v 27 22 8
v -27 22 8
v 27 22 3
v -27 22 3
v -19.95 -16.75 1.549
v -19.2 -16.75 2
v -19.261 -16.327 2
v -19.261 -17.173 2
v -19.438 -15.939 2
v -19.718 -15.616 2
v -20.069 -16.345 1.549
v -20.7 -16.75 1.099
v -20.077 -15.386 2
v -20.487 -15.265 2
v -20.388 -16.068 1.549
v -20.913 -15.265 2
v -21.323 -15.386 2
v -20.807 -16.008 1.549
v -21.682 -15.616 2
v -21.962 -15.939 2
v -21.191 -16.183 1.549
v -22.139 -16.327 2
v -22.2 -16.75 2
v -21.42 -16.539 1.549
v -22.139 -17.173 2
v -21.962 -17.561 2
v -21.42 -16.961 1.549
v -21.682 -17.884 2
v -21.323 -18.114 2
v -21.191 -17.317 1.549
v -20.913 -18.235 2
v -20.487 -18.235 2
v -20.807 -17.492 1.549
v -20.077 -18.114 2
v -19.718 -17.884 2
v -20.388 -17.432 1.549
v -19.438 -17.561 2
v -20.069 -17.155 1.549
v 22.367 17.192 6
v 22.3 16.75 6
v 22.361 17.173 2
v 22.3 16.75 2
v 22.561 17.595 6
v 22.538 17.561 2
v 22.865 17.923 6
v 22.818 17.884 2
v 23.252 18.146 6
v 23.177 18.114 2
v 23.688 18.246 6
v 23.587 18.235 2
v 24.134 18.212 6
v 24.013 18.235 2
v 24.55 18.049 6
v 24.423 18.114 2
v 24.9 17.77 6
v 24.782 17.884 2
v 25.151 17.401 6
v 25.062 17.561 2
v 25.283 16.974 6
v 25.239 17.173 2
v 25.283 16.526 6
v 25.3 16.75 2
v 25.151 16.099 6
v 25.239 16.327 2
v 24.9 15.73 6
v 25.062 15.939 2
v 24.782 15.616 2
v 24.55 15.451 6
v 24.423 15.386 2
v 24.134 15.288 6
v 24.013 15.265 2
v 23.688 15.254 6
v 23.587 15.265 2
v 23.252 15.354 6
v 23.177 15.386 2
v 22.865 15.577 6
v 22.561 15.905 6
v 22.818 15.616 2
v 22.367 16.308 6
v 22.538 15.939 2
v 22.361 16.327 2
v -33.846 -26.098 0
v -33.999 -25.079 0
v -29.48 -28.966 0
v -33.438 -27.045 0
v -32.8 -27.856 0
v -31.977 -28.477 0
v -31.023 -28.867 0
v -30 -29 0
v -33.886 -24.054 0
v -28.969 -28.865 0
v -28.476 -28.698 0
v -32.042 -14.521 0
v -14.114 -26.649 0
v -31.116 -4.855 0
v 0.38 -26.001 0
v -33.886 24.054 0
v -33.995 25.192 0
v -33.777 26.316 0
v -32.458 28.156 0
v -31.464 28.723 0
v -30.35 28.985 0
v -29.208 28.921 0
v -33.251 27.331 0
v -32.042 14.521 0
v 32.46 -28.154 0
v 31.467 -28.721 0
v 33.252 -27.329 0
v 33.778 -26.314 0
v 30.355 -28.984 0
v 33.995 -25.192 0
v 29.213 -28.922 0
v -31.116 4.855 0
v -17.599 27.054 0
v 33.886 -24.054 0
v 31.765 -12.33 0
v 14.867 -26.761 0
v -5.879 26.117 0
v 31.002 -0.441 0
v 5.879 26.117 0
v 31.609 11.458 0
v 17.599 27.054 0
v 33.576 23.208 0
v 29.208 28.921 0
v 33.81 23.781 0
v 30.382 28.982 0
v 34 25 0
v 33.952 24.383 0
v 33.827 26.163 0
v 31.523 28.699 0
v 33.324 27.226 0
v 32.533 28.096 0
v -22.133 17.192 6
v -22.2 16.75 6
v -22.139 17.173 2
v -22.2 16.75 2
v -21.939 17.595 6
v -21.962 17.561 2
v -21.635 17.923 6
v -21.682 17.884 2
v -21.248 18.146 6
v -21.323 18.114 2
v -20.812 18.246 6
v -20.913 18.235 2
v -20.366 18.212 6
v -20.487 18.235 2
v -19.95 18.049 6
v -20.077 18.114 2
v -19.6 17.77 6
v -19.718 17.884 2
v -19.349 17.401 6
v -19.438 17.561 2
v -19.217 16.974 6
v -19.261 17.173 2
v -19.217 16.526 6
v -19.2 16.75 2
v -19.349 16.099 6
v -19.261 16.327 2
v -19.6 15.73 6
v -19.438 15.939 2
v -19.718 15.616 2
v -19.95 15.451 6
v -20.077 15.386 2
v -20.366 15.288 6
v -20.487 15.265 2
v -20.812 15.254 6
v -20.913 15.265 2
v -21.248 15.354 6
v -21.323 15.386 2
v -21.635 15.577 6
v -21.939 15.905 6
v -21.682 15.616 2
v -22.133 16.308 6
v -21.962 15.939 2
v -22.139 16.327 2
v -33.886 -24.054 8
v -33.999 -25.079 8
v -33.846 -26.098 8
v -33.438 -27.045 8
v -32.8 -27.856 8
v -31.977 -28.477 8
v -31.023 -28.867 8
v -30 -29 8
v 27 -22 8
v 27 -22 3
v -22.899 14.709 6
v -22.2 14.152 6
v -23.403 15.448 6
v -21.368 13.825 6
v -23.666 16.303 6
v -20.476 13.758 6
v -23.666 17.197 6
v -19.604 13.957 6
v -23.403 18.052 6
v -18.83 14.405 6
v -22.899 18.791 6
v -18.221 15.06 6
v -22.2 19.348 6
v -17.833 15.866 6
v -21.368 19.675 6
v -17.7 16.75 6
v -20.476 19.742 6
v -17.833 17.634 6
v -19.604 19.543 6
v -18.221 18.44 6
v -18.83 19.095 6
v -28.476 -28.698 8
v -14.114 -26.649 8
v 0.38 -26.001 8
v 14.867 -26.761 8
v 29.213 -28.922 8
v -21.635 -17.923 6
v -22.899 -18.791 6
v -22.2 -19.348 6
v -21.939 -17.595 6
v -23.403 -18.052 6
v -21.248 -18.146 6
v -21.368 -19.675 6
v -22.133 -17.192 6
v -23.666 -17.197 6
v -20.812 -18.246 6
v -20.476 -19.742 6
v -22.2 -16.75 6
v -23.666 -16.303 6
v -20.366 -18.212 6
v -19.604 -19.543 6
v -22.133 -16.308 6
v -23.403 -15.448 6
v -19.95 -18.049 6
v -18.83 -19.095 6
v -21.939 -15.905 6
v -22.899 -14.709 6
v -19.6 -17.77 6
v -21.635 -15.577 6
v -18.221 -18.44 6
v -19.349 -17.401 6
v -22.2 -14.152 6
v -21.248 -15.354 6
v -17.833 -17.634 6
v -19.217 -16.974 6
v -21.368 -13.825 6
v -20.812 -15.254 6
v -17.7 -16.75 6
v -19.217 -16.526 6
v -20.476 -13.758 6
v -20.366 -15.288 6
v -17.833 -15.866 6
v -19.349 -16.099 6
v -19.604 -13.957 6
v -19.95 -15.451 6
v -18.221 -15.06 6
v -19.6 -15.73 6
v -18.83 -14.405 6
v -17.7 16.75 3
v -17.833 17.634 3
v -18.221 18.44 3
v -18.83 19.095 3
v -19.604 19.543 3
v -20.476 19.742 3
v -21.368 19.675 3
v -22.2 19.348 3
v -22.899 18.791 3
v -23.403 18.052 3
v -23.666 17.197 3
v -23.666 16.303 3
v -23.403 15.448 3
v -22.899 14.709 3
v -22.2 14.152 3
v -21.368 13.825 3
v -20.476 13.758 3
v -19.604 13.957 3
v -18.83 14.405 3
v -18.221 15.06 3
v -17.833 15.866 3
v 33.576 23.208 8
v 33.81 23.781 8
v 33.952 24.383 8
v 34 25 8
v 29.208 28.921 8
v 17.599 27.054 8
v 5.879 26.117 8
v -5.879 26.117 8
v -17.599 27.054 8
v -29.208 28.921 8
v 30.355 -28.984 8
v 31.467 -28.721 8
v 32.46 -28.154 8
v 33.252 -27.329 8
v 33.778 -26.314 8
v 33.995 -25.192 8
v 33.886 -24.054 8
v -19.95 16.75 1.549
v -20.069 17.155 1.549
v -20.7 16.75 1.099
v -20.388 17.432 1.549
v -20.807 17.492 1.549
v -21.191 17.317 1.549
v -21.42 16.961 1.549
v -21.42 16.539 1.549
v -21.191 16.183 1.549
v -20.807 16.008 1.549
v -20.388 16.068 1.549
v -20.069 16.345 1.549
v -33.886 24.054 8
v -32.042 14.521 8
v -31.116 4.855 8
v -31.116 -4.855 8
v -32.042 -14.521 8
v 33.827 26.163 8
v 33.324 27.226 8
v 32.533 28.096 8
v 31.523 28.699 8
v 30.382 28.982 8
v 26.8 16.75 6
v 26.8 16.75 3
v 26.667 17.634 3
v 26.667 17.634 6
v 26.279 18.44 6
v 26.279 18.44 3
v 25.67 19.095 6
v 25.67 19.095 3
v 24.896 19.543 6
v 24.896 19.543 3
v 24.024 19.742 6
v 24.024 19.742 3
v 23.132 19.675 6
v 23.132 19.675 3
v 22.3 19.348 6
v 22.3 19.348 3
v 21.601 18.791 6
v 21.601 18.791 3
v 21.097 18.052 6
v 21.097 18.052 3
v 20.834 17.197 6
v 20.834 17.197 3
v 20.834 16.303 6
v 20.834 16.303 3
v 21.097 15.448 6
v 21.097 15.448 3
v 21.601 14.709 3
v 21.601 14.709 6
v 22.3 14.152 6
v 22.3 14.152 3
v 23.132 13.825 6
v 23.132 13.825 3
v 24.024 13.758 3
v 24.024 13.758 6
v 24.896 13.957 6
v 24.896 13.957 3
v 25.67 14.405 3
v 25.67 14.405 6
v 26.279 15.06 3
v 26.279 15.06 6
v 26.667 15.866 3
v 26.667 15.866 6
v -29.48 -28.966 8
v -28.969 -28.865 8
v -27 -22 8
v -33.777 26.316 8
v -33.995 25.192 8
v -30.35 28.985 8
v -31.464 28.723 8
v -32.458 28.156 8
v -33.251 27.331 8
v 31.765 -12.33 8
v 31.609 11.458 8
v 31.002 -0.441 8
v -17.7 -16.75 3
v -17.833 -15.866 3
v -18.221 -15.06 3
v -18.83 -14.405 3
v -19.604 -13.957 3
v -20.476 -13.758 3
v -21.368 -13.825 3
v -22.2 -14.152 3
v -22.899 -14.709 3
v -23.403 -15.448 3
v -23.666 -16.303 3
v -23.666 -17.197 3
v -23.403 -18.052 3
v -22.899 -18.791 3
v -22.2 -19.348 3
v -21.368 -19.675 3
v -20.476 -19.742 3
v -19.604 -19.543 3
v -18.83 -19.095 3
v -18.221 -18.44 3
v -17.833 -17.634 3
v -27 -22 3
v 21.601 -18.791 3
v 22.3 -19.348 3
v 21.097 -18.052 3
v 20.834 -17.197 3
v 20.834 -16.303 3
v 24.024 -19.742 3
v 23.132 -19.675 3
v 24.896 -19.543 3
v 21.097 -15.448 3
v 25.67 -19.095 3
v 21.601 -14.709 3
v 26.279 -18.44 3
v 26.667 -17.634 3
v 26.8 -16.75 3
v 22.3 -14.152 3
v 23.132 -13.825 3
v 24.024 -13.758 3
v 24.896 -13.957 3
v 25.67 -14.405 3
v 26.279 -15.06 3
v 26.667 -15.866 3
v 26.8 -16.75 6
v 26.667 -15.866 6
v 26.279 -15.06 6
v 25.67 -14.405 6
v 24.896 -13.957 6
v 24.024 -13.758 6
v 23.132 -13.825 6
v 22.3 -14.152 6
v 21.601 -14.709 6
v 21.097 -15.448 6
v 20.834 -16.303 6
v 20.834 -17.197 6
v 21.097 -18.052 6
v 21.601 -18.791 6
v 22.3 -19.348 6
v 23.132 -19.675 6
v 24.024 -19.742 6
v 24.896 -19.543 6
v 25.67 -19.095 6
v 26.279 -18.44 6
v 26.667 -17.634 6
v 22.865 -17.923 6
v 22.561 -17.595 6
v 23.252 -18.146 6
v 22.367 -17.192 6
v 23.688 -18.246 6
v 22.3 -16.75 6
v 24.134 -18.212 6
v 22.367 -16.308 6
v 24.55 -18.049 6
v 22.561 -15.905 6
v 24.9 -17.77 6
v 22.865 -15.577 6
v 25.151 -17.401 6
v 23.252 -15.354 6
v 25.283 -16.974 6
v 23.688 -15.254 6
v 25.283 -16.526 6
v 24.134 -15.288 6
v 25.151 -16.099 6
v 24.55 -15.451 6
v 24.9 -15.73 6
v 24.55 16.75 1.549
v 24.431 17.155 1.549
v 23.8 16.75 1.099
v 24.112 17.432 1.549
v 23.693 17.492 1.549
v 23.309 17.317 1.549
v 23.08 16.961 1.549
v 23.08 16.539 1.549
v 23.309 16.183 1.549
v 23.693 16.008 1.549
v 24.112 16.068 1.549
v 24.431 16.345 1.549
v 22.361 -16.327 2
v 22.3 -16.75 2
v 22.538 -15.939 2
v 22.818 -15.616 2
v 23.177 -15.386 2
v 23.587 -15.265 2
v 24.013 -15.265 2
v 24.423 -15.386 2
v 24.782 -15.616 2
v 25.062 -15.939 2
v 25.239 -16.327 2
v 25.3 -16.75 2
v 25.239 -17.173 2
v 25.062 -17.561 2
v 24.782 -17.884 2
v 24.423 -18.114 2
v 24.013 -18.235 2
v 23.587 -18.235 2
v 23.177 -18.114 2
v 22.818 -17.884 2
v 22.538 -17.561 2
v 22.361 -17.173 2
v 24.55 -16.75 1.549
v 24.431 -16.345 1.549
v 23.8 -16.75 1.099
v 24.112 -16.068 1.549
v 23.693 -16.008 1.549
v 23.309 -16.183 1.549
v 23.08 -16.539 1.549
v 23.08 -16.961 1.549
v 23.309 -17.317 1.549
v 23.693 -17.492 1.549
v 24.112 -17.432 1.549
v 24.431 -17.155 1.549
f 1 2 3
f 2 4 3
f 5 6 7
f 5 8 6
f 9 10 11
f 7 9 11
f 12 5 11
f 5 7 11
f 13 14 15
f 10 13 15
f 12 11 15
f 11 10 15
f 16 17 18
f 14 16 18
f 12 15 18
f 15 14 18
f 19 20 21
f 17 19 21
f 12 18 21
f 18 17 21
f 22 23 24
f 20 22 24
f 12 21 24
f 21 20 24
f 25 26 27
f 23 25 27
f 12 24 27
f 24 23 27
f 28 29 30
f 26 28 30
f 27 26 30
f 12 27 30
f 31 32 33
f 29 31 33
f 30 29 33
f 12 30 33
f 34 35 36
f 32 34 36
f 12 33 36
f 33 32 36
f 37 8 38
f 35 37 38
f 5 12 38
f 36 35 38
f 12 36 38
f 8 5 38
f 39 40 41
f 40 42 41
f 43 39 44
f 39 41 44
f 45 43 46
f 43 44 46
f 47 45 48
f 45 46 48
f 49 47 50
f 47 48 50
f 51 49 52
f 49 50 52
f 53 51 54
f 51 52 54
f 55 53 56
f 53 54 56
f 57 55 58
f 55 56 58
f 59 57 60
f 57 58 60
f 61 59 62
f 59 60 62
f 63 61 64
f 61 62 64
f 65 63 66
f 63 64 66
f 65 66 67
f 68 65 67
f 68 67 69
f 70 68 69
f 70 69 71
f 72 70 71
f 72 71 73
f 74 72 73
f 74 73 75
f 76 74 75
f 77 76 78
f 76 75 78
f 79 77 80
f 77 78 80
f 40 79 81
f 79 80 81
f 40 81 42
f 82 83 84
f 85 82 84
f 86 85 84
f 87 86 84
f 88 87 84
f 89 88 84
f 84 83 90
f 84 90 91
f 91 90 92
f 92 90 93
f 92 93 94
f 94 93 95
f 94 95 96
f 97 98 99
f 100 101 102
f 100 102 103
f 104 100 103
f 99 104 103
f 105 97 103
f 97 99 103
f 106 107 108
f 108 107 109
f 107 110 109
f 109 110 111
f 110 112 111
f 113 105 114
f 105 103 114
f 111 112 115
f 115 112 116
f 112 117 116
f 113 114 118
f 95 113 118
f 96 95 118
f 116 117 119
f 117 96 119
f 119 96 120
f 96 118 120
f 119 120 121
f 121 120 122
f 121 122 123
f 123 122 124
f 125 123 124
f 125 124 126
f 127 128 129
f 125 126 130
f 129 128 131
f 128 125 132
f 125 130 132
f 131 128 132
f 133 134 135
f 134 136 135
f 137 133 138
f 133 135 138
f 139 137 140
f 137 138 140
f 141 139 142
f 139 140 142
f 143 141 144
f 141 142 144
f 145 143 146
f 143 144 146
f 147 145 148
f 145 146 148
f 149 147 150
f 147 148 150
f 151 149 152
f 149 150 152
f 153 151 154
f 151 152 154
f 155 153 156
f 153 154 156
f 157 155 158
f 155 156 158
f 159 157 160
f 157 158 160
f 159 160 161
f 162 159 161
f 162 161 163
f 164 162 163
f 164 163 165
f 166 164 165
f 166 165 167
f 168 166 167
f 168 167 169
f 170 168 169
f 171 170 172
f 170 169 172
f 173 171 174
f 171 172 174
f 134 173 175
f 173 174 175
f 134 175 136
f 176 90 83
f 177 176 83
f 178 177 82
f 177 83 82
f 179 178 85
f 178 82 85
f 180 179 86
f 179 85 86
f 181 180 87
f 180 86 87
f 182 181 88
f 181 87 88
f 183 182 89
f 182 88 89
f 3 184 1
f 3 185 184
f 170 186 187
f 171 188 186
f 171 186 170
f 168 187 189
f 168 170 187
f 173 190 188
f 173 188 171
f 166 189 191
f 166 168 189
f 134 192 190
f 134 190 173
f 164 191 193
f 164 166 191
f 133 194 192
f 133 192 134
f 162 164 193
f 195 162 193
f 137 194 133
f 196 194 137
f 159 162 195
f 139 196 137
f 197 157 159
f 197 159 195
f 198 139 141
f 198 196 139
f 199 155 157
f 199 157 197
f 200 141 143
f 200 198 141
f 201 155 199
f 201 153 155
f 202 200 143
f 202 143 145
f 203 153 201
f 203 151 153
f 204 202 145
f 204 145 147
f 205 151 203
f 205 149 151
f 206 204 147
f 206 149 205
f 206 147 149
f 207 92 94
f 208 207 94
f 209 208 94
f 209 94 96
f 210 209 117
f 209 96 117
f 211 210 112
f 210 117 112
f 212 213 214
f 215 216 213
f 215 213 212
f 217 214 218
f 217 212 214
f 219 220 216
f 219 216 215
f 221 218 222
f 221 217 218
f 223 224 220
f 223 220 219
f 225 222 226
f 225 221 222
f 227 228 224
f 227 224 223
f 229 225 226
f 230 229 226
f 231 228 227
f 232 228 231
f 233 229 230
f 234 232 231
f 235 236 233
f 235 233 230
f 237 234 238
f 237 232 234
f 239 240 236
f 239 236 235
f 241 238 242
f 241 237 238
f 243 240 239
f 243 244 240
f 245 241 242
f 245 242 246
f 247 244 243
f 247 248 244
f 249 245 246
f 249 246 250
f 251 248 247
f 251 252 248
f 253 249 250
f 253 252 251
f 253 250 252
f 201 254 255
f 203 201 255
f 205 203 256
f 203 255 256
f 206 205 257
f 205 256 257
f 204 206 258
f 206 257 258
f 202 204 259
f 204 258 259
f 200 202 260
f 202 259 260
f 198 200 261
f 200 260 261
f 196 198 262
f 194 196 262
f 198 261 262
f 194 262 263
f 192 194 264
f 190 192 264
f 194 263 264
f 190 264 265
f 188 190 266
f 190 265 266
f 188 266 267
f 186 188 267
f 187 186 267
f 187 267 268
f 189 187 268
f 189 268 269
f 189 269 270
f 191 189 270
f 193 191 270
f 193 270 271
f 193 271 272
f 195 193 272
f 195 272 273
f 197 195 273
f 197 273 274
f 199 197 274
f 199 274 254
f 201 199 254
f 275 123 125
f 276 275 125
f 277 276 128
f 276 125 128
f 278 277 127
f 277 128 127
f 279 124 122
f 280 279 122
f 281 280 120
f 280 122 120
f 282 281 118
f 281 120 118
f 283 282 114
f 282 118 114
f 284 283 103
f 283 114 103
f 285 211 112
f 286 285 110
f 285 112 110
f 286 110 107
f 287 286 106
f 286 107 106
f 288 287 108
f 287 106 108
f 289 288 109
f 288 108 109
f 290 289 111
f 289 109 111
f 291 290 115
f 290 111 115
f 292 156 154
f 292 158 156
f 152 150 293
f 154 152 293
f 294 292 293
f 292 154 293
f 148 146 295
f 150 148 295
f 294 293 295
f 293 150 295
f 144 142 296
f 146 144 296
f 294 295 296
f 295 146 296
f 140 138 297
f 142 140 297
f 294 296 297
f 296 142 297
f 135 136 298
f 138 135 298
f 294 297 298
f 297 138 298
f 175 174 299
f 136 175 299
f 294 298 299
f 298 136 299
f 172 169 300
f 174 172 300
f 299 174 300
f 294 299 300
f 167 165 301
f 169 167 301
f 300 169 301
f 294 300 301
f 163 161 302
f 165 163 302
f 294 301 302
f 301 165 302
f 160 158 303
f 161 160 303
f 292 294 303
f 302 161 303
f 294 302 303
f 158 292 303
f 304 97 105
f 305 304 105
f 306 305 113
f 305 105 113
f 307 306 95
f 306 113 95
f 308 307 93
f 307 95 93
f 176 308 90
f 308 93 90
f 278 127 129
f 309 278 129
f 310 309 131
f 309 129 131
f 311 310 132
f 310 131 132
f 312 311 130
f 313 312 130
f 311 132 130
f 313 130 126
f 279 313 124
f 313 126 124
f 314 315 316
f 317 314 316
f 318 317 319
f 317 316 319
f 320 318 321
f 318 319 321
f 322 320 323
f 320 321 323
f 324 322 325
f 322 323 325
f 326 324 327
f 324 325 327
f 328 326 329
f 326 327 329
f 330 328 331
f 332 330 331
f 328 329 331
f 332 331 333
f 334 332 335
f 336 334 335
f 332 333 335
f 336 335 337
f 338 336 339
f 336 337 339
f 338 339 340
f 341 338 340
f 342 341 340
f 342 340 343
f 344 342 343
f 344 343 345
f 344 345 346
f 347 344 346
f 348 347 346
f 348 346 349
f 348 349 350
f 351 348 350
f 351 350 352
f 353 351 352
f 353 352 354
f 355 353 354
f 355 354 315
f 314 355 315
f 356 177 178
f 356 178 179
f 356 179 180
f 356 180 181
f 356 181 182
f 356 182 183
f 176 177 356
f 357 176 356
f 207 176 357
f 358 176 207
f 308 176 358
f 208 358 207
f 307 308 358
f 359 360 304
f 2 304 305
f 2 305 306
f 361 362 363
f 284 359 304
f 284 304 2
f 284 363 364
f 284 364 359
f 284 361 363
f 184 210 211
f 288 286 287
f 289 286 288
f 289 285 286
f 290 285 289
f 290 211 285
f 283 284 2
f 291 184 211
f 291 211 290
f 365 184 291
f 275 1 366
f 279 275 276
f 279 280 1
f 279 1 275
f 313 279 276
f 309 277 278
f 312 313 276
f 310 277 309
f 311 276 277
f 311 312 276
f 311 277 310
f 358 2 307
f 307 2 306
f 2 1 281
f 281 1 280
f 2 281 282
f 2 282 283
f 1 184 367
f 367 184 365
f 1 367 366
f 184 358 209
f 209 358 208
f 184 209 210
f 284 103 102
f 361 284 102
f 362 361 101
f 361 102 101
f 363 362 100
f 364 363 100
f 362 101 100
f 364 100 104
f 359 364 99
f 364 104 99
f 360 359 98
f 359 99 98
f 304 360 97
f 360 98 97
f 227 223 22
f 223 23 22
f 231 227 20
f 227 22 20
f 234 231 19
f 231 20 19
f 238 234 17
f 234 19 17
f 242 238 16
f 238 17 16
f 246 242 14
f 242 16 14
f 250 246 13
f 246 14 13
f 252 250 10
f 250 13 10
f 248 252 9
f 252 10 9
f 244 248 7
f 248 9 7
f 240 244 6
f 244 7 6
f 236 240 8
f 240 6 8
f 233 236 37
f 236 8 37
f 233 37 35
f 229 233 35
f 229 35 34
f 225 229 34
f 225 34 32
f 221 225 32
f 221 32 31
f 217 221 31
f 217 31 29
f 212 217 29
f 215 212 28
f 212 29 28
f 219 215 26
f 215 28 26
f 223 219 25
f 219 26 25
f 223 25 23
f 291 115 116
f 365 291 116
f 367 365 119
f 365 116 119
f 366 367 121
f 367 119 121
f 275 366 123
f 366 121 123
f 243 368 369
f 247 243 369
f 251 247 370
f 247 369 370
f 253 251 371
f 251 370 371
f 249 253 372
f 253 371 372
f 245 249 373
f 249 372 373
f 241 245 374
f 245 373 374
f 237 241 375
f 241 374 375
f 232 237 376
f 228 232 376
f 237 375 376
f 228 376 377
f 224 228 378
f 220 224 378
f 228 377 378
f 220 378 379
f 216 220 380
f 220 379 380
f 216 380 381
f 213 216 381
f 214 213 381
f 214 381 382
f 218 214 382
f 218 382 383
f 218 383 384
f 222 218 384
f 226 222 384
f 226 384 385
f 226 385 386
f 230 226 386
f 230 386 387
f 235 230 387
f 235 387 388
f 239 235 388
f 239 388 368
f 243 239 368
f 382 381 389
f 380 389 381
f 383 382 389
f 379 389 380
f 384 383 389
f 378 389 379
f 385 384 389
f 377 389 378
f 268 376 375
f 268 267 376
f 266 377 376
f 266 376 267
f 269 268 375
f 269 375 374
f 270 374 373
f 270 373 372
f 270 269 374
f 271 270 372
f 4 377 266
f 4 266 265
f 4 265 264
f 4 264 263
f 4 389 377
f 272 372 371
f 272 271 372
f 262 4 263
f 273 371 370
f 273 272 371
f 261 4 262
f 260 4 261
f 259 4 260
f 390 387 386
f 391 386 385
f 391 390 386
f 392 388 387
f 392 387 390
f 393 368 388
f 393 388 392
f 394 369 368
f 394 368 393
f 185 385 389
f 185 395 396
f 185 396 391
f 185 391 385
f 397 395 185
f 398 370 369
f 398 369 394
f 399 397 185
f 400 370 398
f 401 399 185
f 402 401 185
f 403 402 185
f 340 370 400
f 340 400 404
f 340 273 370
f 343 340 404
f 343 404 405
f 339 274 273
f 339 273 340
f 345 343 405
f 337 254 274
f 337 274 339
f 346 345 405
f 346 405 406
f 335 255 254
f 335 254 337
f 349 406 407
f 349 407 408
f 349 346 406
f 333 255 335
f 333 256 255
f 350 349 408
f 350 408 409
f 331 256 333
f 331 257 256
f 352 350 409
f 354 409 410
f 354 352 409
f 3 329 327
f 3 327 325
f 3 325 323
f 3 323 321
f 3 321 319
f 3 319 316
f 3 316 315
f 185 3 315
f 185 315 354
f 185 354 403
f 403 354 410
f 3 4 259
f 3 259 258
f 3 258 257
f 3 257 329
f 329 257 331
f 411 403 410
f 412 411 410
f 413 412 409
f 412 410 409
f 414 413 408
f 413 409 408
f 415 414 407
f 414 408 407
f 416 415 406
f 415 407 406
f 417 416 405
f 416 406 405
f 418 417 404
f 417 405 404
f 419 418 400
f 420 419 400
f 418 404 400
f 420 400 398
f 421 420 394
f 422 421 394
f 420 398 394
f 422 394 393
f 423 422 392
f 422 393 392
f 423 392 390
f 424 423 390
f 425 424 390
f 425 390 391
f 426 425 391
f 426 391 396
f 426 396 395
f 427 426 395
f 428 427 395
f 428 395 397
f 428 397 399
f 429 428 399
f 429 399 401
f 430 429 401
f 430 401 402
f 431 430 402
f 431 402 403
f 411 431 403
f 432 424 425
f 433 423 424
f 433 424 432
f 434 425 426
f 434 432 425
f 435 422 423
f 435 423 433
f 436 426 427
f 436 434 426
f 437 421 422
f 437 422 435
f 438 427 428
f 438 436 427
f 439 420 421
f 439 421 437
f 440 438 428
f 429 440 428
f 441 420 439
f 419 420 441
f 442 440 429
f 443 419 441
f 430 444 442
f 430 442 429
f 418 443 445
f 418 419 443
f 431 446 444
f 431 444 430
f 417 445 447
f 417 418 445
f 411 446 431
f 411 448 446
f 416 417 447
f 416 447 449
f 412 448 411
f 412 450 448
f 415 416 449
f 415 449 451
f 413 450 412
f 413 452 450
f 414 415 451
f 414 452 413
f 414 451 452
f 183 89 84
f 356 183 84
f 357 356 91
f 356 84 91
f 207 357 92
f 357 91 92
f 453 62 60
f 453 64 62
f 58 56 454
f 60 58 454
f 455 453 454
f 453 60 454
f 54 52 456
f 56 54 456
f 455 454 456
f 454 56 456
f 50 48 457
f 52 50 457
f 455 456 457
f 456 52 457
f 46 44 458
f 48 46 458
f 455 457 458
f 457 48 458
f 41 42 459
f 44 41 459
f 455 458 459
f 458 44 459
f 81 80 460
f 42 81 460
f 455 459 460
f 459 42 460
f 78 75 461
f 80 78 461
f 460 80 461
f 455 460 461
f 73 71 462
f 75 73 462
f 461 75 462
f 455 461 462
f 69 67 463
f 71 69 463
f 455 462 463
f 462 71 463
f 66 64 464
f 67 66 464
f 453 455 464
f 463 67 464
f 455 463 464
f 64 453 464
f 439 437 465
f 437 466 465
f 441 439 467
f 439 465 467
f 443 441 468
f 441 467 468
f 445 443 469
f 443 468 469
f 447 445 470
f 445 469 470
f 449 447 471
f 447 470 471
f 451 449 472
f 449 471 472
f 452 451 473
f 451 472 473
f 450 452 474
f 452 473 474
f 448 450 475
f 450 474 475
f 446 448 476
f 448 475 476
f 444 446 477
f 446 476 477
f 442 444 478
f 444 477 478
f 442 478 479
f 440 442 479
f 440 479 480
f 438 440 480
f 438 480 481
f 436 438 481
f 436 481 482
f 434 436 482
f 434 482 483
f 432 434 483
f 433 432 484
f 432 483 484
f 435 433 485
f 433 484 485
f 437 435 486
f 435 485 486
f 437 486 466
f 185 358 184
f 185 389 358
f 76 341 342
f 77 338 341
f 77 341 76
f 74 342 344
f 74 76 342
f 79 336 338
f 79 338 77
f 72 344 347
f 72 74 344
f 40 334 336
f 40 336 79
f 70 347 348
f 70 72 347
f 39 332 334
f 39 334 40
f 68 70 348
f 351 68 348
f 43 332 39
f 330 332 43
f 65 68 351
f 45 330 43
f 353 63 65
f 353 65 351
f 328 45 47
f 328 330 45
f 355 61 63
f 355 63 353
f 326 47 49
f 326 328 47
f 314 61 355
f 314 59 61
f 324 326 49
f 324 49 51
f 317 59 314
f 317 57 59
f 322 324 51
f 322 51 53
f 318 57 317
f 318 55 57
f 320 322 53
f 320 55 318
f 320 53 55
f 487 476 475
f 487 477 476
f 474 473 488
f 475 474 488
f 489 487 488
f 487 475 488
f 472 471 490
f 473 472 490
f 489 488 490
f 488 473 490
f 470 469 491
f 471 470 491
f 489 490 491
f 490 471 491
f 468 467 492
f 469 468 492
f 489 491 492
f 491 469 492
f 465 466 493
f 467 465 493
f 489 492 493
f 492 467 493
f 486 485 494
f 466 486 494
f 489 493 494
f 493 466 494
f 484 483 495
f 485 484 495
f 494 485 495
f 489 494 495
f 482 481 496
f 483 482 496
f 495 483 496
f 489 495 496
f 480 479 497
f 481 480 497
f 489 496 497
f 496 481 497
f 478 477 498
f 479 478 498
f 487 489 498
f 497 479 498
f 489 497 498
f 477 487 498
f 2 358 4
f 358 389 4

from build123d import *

# Parameters (mm, degrees)
F0_W     = 60
F0_H     = 50
F1_DEPTH = 8
F2_T     = -3
F3_R     = 3
F4_DEPTH = 6
F6_D     = 3
F6_DEPTH = 4
F6_TIP   = 0.9012909285
F7_W     = 60
F7_H     = 50
F8_DEPTH = 8


with BuildPart() as f1:
    # F0 (on Top) → F1 (new body)
    with BuildSketch(Plane.XY):
        Rectangle(F0_W, F0_H)
    extrude(amount=F1_DEPTH)

    # F2
    f2_openings = [f1.faces().sort_by_distance(p)[0] for p in [
        (0, 0, 8),
    ]]
    offset(amount=F2_T, openings=f2_openings)

    # F3 (on face) → F4 (join)
    with BuildSketch(Plane.XY):
        with Locations((-20.7, -16.75)):
            Circle(F3_R)
        with Locations((-20.7, 16.75)):
            Circle(F3_R)
        with Locations((23.8, -16.75)):
            Circle(F3_R)
        with Locations((23.8, 16.75)):
            Circle(F3_R)
    extrude(amount=F4_DEPTH)

    # F6
    with Locations(Plane.XY.offset(6)):
        with Locations((23.8, 16.75), (23.8, -16.75), (-20.7, -16.75), (-20.7, 16.75)):
            Hole(F6_D / 2, depth=F6_DEPTH)
            with Locations((0, 0, -(F6_DEPTH + F6_TIP / 2))):  # 118° drill point
                Cone(0, F6_D / 2, F6_TIP, mode=Mode.SUBTRACT)

    # F7 (on face) → F8 (join, through all)
    with BuildSketch(Plane.XY):
        with BuildLine():
            ThreePointArc((29.2079207921, 28.9207920792), (0, 26), (-29.2079207921, 28.9207920792))
            ThreePointArc((-29.2079207921, 28.9207920792), (-32.8837617935, 27.7719880805), (-33.8864353312, 24.0536277603))
            ThreePointArc((-33.8864353312, 24.0536277603), (-31, 0), (-33.8864353312, -24.0536277603))
            ThreePointArc((-33.8864353312, -24.0536277603), (-33.1452733553, -27.4712862077), (-30, -29))
            ThreePointArc((-30, -29), (-29.2382778582, -28.8471228354), (-28.475771577, -28.698206013))
            ThreePointArc((-28.475771577, -28.698206013), (0.379534182, -26.0011232313), (29.2130634934, -28.9218274993))
            ThreePointArc((29.2130634934, -28.9218274993), (32.8855788702, -27.7700964936), (33.8864353312, -24.0536277603))
            ThreePointArc((33.8864353312, -24.0536277603), (31.0022348413, -0.4407544994), (33.5761126117, 23.2079568676))
            ThreePointArc((33.5761126117, 23.2079568676), (33.7840774597, 24.1049195845), (34, 25))
            ThreePointArc((34, 25), (32.532951161, 28.0958291968), (29.2079207921, 28.9207920792))
        make_face()
        Rectangle(F7_W, F7_H, mode=Mode.SUBTRACT)
        with BuildLine():
            ThreePointArc((33.5761126117, 23.2079568676), (33.8925859301, 24.079253142), (34, 25))
            ThreePointArc((34, 25), (33.7840774597, 24.1049195845), (33.5761126117, 23.2079568676))
        make_face()
        with BuildLine():
            ThreePointArc((-28.475771577, -28.698206013), (-29.2382778582, -28.8471228354), (-30, -29))
            ThreePointArc((-30, -29), (-29.2230907556, -28.9238261972), (-28.475771577, -28.698206013))
        make_face()
    extrude(amount=F8_DEPTH)


solid = f1.part
